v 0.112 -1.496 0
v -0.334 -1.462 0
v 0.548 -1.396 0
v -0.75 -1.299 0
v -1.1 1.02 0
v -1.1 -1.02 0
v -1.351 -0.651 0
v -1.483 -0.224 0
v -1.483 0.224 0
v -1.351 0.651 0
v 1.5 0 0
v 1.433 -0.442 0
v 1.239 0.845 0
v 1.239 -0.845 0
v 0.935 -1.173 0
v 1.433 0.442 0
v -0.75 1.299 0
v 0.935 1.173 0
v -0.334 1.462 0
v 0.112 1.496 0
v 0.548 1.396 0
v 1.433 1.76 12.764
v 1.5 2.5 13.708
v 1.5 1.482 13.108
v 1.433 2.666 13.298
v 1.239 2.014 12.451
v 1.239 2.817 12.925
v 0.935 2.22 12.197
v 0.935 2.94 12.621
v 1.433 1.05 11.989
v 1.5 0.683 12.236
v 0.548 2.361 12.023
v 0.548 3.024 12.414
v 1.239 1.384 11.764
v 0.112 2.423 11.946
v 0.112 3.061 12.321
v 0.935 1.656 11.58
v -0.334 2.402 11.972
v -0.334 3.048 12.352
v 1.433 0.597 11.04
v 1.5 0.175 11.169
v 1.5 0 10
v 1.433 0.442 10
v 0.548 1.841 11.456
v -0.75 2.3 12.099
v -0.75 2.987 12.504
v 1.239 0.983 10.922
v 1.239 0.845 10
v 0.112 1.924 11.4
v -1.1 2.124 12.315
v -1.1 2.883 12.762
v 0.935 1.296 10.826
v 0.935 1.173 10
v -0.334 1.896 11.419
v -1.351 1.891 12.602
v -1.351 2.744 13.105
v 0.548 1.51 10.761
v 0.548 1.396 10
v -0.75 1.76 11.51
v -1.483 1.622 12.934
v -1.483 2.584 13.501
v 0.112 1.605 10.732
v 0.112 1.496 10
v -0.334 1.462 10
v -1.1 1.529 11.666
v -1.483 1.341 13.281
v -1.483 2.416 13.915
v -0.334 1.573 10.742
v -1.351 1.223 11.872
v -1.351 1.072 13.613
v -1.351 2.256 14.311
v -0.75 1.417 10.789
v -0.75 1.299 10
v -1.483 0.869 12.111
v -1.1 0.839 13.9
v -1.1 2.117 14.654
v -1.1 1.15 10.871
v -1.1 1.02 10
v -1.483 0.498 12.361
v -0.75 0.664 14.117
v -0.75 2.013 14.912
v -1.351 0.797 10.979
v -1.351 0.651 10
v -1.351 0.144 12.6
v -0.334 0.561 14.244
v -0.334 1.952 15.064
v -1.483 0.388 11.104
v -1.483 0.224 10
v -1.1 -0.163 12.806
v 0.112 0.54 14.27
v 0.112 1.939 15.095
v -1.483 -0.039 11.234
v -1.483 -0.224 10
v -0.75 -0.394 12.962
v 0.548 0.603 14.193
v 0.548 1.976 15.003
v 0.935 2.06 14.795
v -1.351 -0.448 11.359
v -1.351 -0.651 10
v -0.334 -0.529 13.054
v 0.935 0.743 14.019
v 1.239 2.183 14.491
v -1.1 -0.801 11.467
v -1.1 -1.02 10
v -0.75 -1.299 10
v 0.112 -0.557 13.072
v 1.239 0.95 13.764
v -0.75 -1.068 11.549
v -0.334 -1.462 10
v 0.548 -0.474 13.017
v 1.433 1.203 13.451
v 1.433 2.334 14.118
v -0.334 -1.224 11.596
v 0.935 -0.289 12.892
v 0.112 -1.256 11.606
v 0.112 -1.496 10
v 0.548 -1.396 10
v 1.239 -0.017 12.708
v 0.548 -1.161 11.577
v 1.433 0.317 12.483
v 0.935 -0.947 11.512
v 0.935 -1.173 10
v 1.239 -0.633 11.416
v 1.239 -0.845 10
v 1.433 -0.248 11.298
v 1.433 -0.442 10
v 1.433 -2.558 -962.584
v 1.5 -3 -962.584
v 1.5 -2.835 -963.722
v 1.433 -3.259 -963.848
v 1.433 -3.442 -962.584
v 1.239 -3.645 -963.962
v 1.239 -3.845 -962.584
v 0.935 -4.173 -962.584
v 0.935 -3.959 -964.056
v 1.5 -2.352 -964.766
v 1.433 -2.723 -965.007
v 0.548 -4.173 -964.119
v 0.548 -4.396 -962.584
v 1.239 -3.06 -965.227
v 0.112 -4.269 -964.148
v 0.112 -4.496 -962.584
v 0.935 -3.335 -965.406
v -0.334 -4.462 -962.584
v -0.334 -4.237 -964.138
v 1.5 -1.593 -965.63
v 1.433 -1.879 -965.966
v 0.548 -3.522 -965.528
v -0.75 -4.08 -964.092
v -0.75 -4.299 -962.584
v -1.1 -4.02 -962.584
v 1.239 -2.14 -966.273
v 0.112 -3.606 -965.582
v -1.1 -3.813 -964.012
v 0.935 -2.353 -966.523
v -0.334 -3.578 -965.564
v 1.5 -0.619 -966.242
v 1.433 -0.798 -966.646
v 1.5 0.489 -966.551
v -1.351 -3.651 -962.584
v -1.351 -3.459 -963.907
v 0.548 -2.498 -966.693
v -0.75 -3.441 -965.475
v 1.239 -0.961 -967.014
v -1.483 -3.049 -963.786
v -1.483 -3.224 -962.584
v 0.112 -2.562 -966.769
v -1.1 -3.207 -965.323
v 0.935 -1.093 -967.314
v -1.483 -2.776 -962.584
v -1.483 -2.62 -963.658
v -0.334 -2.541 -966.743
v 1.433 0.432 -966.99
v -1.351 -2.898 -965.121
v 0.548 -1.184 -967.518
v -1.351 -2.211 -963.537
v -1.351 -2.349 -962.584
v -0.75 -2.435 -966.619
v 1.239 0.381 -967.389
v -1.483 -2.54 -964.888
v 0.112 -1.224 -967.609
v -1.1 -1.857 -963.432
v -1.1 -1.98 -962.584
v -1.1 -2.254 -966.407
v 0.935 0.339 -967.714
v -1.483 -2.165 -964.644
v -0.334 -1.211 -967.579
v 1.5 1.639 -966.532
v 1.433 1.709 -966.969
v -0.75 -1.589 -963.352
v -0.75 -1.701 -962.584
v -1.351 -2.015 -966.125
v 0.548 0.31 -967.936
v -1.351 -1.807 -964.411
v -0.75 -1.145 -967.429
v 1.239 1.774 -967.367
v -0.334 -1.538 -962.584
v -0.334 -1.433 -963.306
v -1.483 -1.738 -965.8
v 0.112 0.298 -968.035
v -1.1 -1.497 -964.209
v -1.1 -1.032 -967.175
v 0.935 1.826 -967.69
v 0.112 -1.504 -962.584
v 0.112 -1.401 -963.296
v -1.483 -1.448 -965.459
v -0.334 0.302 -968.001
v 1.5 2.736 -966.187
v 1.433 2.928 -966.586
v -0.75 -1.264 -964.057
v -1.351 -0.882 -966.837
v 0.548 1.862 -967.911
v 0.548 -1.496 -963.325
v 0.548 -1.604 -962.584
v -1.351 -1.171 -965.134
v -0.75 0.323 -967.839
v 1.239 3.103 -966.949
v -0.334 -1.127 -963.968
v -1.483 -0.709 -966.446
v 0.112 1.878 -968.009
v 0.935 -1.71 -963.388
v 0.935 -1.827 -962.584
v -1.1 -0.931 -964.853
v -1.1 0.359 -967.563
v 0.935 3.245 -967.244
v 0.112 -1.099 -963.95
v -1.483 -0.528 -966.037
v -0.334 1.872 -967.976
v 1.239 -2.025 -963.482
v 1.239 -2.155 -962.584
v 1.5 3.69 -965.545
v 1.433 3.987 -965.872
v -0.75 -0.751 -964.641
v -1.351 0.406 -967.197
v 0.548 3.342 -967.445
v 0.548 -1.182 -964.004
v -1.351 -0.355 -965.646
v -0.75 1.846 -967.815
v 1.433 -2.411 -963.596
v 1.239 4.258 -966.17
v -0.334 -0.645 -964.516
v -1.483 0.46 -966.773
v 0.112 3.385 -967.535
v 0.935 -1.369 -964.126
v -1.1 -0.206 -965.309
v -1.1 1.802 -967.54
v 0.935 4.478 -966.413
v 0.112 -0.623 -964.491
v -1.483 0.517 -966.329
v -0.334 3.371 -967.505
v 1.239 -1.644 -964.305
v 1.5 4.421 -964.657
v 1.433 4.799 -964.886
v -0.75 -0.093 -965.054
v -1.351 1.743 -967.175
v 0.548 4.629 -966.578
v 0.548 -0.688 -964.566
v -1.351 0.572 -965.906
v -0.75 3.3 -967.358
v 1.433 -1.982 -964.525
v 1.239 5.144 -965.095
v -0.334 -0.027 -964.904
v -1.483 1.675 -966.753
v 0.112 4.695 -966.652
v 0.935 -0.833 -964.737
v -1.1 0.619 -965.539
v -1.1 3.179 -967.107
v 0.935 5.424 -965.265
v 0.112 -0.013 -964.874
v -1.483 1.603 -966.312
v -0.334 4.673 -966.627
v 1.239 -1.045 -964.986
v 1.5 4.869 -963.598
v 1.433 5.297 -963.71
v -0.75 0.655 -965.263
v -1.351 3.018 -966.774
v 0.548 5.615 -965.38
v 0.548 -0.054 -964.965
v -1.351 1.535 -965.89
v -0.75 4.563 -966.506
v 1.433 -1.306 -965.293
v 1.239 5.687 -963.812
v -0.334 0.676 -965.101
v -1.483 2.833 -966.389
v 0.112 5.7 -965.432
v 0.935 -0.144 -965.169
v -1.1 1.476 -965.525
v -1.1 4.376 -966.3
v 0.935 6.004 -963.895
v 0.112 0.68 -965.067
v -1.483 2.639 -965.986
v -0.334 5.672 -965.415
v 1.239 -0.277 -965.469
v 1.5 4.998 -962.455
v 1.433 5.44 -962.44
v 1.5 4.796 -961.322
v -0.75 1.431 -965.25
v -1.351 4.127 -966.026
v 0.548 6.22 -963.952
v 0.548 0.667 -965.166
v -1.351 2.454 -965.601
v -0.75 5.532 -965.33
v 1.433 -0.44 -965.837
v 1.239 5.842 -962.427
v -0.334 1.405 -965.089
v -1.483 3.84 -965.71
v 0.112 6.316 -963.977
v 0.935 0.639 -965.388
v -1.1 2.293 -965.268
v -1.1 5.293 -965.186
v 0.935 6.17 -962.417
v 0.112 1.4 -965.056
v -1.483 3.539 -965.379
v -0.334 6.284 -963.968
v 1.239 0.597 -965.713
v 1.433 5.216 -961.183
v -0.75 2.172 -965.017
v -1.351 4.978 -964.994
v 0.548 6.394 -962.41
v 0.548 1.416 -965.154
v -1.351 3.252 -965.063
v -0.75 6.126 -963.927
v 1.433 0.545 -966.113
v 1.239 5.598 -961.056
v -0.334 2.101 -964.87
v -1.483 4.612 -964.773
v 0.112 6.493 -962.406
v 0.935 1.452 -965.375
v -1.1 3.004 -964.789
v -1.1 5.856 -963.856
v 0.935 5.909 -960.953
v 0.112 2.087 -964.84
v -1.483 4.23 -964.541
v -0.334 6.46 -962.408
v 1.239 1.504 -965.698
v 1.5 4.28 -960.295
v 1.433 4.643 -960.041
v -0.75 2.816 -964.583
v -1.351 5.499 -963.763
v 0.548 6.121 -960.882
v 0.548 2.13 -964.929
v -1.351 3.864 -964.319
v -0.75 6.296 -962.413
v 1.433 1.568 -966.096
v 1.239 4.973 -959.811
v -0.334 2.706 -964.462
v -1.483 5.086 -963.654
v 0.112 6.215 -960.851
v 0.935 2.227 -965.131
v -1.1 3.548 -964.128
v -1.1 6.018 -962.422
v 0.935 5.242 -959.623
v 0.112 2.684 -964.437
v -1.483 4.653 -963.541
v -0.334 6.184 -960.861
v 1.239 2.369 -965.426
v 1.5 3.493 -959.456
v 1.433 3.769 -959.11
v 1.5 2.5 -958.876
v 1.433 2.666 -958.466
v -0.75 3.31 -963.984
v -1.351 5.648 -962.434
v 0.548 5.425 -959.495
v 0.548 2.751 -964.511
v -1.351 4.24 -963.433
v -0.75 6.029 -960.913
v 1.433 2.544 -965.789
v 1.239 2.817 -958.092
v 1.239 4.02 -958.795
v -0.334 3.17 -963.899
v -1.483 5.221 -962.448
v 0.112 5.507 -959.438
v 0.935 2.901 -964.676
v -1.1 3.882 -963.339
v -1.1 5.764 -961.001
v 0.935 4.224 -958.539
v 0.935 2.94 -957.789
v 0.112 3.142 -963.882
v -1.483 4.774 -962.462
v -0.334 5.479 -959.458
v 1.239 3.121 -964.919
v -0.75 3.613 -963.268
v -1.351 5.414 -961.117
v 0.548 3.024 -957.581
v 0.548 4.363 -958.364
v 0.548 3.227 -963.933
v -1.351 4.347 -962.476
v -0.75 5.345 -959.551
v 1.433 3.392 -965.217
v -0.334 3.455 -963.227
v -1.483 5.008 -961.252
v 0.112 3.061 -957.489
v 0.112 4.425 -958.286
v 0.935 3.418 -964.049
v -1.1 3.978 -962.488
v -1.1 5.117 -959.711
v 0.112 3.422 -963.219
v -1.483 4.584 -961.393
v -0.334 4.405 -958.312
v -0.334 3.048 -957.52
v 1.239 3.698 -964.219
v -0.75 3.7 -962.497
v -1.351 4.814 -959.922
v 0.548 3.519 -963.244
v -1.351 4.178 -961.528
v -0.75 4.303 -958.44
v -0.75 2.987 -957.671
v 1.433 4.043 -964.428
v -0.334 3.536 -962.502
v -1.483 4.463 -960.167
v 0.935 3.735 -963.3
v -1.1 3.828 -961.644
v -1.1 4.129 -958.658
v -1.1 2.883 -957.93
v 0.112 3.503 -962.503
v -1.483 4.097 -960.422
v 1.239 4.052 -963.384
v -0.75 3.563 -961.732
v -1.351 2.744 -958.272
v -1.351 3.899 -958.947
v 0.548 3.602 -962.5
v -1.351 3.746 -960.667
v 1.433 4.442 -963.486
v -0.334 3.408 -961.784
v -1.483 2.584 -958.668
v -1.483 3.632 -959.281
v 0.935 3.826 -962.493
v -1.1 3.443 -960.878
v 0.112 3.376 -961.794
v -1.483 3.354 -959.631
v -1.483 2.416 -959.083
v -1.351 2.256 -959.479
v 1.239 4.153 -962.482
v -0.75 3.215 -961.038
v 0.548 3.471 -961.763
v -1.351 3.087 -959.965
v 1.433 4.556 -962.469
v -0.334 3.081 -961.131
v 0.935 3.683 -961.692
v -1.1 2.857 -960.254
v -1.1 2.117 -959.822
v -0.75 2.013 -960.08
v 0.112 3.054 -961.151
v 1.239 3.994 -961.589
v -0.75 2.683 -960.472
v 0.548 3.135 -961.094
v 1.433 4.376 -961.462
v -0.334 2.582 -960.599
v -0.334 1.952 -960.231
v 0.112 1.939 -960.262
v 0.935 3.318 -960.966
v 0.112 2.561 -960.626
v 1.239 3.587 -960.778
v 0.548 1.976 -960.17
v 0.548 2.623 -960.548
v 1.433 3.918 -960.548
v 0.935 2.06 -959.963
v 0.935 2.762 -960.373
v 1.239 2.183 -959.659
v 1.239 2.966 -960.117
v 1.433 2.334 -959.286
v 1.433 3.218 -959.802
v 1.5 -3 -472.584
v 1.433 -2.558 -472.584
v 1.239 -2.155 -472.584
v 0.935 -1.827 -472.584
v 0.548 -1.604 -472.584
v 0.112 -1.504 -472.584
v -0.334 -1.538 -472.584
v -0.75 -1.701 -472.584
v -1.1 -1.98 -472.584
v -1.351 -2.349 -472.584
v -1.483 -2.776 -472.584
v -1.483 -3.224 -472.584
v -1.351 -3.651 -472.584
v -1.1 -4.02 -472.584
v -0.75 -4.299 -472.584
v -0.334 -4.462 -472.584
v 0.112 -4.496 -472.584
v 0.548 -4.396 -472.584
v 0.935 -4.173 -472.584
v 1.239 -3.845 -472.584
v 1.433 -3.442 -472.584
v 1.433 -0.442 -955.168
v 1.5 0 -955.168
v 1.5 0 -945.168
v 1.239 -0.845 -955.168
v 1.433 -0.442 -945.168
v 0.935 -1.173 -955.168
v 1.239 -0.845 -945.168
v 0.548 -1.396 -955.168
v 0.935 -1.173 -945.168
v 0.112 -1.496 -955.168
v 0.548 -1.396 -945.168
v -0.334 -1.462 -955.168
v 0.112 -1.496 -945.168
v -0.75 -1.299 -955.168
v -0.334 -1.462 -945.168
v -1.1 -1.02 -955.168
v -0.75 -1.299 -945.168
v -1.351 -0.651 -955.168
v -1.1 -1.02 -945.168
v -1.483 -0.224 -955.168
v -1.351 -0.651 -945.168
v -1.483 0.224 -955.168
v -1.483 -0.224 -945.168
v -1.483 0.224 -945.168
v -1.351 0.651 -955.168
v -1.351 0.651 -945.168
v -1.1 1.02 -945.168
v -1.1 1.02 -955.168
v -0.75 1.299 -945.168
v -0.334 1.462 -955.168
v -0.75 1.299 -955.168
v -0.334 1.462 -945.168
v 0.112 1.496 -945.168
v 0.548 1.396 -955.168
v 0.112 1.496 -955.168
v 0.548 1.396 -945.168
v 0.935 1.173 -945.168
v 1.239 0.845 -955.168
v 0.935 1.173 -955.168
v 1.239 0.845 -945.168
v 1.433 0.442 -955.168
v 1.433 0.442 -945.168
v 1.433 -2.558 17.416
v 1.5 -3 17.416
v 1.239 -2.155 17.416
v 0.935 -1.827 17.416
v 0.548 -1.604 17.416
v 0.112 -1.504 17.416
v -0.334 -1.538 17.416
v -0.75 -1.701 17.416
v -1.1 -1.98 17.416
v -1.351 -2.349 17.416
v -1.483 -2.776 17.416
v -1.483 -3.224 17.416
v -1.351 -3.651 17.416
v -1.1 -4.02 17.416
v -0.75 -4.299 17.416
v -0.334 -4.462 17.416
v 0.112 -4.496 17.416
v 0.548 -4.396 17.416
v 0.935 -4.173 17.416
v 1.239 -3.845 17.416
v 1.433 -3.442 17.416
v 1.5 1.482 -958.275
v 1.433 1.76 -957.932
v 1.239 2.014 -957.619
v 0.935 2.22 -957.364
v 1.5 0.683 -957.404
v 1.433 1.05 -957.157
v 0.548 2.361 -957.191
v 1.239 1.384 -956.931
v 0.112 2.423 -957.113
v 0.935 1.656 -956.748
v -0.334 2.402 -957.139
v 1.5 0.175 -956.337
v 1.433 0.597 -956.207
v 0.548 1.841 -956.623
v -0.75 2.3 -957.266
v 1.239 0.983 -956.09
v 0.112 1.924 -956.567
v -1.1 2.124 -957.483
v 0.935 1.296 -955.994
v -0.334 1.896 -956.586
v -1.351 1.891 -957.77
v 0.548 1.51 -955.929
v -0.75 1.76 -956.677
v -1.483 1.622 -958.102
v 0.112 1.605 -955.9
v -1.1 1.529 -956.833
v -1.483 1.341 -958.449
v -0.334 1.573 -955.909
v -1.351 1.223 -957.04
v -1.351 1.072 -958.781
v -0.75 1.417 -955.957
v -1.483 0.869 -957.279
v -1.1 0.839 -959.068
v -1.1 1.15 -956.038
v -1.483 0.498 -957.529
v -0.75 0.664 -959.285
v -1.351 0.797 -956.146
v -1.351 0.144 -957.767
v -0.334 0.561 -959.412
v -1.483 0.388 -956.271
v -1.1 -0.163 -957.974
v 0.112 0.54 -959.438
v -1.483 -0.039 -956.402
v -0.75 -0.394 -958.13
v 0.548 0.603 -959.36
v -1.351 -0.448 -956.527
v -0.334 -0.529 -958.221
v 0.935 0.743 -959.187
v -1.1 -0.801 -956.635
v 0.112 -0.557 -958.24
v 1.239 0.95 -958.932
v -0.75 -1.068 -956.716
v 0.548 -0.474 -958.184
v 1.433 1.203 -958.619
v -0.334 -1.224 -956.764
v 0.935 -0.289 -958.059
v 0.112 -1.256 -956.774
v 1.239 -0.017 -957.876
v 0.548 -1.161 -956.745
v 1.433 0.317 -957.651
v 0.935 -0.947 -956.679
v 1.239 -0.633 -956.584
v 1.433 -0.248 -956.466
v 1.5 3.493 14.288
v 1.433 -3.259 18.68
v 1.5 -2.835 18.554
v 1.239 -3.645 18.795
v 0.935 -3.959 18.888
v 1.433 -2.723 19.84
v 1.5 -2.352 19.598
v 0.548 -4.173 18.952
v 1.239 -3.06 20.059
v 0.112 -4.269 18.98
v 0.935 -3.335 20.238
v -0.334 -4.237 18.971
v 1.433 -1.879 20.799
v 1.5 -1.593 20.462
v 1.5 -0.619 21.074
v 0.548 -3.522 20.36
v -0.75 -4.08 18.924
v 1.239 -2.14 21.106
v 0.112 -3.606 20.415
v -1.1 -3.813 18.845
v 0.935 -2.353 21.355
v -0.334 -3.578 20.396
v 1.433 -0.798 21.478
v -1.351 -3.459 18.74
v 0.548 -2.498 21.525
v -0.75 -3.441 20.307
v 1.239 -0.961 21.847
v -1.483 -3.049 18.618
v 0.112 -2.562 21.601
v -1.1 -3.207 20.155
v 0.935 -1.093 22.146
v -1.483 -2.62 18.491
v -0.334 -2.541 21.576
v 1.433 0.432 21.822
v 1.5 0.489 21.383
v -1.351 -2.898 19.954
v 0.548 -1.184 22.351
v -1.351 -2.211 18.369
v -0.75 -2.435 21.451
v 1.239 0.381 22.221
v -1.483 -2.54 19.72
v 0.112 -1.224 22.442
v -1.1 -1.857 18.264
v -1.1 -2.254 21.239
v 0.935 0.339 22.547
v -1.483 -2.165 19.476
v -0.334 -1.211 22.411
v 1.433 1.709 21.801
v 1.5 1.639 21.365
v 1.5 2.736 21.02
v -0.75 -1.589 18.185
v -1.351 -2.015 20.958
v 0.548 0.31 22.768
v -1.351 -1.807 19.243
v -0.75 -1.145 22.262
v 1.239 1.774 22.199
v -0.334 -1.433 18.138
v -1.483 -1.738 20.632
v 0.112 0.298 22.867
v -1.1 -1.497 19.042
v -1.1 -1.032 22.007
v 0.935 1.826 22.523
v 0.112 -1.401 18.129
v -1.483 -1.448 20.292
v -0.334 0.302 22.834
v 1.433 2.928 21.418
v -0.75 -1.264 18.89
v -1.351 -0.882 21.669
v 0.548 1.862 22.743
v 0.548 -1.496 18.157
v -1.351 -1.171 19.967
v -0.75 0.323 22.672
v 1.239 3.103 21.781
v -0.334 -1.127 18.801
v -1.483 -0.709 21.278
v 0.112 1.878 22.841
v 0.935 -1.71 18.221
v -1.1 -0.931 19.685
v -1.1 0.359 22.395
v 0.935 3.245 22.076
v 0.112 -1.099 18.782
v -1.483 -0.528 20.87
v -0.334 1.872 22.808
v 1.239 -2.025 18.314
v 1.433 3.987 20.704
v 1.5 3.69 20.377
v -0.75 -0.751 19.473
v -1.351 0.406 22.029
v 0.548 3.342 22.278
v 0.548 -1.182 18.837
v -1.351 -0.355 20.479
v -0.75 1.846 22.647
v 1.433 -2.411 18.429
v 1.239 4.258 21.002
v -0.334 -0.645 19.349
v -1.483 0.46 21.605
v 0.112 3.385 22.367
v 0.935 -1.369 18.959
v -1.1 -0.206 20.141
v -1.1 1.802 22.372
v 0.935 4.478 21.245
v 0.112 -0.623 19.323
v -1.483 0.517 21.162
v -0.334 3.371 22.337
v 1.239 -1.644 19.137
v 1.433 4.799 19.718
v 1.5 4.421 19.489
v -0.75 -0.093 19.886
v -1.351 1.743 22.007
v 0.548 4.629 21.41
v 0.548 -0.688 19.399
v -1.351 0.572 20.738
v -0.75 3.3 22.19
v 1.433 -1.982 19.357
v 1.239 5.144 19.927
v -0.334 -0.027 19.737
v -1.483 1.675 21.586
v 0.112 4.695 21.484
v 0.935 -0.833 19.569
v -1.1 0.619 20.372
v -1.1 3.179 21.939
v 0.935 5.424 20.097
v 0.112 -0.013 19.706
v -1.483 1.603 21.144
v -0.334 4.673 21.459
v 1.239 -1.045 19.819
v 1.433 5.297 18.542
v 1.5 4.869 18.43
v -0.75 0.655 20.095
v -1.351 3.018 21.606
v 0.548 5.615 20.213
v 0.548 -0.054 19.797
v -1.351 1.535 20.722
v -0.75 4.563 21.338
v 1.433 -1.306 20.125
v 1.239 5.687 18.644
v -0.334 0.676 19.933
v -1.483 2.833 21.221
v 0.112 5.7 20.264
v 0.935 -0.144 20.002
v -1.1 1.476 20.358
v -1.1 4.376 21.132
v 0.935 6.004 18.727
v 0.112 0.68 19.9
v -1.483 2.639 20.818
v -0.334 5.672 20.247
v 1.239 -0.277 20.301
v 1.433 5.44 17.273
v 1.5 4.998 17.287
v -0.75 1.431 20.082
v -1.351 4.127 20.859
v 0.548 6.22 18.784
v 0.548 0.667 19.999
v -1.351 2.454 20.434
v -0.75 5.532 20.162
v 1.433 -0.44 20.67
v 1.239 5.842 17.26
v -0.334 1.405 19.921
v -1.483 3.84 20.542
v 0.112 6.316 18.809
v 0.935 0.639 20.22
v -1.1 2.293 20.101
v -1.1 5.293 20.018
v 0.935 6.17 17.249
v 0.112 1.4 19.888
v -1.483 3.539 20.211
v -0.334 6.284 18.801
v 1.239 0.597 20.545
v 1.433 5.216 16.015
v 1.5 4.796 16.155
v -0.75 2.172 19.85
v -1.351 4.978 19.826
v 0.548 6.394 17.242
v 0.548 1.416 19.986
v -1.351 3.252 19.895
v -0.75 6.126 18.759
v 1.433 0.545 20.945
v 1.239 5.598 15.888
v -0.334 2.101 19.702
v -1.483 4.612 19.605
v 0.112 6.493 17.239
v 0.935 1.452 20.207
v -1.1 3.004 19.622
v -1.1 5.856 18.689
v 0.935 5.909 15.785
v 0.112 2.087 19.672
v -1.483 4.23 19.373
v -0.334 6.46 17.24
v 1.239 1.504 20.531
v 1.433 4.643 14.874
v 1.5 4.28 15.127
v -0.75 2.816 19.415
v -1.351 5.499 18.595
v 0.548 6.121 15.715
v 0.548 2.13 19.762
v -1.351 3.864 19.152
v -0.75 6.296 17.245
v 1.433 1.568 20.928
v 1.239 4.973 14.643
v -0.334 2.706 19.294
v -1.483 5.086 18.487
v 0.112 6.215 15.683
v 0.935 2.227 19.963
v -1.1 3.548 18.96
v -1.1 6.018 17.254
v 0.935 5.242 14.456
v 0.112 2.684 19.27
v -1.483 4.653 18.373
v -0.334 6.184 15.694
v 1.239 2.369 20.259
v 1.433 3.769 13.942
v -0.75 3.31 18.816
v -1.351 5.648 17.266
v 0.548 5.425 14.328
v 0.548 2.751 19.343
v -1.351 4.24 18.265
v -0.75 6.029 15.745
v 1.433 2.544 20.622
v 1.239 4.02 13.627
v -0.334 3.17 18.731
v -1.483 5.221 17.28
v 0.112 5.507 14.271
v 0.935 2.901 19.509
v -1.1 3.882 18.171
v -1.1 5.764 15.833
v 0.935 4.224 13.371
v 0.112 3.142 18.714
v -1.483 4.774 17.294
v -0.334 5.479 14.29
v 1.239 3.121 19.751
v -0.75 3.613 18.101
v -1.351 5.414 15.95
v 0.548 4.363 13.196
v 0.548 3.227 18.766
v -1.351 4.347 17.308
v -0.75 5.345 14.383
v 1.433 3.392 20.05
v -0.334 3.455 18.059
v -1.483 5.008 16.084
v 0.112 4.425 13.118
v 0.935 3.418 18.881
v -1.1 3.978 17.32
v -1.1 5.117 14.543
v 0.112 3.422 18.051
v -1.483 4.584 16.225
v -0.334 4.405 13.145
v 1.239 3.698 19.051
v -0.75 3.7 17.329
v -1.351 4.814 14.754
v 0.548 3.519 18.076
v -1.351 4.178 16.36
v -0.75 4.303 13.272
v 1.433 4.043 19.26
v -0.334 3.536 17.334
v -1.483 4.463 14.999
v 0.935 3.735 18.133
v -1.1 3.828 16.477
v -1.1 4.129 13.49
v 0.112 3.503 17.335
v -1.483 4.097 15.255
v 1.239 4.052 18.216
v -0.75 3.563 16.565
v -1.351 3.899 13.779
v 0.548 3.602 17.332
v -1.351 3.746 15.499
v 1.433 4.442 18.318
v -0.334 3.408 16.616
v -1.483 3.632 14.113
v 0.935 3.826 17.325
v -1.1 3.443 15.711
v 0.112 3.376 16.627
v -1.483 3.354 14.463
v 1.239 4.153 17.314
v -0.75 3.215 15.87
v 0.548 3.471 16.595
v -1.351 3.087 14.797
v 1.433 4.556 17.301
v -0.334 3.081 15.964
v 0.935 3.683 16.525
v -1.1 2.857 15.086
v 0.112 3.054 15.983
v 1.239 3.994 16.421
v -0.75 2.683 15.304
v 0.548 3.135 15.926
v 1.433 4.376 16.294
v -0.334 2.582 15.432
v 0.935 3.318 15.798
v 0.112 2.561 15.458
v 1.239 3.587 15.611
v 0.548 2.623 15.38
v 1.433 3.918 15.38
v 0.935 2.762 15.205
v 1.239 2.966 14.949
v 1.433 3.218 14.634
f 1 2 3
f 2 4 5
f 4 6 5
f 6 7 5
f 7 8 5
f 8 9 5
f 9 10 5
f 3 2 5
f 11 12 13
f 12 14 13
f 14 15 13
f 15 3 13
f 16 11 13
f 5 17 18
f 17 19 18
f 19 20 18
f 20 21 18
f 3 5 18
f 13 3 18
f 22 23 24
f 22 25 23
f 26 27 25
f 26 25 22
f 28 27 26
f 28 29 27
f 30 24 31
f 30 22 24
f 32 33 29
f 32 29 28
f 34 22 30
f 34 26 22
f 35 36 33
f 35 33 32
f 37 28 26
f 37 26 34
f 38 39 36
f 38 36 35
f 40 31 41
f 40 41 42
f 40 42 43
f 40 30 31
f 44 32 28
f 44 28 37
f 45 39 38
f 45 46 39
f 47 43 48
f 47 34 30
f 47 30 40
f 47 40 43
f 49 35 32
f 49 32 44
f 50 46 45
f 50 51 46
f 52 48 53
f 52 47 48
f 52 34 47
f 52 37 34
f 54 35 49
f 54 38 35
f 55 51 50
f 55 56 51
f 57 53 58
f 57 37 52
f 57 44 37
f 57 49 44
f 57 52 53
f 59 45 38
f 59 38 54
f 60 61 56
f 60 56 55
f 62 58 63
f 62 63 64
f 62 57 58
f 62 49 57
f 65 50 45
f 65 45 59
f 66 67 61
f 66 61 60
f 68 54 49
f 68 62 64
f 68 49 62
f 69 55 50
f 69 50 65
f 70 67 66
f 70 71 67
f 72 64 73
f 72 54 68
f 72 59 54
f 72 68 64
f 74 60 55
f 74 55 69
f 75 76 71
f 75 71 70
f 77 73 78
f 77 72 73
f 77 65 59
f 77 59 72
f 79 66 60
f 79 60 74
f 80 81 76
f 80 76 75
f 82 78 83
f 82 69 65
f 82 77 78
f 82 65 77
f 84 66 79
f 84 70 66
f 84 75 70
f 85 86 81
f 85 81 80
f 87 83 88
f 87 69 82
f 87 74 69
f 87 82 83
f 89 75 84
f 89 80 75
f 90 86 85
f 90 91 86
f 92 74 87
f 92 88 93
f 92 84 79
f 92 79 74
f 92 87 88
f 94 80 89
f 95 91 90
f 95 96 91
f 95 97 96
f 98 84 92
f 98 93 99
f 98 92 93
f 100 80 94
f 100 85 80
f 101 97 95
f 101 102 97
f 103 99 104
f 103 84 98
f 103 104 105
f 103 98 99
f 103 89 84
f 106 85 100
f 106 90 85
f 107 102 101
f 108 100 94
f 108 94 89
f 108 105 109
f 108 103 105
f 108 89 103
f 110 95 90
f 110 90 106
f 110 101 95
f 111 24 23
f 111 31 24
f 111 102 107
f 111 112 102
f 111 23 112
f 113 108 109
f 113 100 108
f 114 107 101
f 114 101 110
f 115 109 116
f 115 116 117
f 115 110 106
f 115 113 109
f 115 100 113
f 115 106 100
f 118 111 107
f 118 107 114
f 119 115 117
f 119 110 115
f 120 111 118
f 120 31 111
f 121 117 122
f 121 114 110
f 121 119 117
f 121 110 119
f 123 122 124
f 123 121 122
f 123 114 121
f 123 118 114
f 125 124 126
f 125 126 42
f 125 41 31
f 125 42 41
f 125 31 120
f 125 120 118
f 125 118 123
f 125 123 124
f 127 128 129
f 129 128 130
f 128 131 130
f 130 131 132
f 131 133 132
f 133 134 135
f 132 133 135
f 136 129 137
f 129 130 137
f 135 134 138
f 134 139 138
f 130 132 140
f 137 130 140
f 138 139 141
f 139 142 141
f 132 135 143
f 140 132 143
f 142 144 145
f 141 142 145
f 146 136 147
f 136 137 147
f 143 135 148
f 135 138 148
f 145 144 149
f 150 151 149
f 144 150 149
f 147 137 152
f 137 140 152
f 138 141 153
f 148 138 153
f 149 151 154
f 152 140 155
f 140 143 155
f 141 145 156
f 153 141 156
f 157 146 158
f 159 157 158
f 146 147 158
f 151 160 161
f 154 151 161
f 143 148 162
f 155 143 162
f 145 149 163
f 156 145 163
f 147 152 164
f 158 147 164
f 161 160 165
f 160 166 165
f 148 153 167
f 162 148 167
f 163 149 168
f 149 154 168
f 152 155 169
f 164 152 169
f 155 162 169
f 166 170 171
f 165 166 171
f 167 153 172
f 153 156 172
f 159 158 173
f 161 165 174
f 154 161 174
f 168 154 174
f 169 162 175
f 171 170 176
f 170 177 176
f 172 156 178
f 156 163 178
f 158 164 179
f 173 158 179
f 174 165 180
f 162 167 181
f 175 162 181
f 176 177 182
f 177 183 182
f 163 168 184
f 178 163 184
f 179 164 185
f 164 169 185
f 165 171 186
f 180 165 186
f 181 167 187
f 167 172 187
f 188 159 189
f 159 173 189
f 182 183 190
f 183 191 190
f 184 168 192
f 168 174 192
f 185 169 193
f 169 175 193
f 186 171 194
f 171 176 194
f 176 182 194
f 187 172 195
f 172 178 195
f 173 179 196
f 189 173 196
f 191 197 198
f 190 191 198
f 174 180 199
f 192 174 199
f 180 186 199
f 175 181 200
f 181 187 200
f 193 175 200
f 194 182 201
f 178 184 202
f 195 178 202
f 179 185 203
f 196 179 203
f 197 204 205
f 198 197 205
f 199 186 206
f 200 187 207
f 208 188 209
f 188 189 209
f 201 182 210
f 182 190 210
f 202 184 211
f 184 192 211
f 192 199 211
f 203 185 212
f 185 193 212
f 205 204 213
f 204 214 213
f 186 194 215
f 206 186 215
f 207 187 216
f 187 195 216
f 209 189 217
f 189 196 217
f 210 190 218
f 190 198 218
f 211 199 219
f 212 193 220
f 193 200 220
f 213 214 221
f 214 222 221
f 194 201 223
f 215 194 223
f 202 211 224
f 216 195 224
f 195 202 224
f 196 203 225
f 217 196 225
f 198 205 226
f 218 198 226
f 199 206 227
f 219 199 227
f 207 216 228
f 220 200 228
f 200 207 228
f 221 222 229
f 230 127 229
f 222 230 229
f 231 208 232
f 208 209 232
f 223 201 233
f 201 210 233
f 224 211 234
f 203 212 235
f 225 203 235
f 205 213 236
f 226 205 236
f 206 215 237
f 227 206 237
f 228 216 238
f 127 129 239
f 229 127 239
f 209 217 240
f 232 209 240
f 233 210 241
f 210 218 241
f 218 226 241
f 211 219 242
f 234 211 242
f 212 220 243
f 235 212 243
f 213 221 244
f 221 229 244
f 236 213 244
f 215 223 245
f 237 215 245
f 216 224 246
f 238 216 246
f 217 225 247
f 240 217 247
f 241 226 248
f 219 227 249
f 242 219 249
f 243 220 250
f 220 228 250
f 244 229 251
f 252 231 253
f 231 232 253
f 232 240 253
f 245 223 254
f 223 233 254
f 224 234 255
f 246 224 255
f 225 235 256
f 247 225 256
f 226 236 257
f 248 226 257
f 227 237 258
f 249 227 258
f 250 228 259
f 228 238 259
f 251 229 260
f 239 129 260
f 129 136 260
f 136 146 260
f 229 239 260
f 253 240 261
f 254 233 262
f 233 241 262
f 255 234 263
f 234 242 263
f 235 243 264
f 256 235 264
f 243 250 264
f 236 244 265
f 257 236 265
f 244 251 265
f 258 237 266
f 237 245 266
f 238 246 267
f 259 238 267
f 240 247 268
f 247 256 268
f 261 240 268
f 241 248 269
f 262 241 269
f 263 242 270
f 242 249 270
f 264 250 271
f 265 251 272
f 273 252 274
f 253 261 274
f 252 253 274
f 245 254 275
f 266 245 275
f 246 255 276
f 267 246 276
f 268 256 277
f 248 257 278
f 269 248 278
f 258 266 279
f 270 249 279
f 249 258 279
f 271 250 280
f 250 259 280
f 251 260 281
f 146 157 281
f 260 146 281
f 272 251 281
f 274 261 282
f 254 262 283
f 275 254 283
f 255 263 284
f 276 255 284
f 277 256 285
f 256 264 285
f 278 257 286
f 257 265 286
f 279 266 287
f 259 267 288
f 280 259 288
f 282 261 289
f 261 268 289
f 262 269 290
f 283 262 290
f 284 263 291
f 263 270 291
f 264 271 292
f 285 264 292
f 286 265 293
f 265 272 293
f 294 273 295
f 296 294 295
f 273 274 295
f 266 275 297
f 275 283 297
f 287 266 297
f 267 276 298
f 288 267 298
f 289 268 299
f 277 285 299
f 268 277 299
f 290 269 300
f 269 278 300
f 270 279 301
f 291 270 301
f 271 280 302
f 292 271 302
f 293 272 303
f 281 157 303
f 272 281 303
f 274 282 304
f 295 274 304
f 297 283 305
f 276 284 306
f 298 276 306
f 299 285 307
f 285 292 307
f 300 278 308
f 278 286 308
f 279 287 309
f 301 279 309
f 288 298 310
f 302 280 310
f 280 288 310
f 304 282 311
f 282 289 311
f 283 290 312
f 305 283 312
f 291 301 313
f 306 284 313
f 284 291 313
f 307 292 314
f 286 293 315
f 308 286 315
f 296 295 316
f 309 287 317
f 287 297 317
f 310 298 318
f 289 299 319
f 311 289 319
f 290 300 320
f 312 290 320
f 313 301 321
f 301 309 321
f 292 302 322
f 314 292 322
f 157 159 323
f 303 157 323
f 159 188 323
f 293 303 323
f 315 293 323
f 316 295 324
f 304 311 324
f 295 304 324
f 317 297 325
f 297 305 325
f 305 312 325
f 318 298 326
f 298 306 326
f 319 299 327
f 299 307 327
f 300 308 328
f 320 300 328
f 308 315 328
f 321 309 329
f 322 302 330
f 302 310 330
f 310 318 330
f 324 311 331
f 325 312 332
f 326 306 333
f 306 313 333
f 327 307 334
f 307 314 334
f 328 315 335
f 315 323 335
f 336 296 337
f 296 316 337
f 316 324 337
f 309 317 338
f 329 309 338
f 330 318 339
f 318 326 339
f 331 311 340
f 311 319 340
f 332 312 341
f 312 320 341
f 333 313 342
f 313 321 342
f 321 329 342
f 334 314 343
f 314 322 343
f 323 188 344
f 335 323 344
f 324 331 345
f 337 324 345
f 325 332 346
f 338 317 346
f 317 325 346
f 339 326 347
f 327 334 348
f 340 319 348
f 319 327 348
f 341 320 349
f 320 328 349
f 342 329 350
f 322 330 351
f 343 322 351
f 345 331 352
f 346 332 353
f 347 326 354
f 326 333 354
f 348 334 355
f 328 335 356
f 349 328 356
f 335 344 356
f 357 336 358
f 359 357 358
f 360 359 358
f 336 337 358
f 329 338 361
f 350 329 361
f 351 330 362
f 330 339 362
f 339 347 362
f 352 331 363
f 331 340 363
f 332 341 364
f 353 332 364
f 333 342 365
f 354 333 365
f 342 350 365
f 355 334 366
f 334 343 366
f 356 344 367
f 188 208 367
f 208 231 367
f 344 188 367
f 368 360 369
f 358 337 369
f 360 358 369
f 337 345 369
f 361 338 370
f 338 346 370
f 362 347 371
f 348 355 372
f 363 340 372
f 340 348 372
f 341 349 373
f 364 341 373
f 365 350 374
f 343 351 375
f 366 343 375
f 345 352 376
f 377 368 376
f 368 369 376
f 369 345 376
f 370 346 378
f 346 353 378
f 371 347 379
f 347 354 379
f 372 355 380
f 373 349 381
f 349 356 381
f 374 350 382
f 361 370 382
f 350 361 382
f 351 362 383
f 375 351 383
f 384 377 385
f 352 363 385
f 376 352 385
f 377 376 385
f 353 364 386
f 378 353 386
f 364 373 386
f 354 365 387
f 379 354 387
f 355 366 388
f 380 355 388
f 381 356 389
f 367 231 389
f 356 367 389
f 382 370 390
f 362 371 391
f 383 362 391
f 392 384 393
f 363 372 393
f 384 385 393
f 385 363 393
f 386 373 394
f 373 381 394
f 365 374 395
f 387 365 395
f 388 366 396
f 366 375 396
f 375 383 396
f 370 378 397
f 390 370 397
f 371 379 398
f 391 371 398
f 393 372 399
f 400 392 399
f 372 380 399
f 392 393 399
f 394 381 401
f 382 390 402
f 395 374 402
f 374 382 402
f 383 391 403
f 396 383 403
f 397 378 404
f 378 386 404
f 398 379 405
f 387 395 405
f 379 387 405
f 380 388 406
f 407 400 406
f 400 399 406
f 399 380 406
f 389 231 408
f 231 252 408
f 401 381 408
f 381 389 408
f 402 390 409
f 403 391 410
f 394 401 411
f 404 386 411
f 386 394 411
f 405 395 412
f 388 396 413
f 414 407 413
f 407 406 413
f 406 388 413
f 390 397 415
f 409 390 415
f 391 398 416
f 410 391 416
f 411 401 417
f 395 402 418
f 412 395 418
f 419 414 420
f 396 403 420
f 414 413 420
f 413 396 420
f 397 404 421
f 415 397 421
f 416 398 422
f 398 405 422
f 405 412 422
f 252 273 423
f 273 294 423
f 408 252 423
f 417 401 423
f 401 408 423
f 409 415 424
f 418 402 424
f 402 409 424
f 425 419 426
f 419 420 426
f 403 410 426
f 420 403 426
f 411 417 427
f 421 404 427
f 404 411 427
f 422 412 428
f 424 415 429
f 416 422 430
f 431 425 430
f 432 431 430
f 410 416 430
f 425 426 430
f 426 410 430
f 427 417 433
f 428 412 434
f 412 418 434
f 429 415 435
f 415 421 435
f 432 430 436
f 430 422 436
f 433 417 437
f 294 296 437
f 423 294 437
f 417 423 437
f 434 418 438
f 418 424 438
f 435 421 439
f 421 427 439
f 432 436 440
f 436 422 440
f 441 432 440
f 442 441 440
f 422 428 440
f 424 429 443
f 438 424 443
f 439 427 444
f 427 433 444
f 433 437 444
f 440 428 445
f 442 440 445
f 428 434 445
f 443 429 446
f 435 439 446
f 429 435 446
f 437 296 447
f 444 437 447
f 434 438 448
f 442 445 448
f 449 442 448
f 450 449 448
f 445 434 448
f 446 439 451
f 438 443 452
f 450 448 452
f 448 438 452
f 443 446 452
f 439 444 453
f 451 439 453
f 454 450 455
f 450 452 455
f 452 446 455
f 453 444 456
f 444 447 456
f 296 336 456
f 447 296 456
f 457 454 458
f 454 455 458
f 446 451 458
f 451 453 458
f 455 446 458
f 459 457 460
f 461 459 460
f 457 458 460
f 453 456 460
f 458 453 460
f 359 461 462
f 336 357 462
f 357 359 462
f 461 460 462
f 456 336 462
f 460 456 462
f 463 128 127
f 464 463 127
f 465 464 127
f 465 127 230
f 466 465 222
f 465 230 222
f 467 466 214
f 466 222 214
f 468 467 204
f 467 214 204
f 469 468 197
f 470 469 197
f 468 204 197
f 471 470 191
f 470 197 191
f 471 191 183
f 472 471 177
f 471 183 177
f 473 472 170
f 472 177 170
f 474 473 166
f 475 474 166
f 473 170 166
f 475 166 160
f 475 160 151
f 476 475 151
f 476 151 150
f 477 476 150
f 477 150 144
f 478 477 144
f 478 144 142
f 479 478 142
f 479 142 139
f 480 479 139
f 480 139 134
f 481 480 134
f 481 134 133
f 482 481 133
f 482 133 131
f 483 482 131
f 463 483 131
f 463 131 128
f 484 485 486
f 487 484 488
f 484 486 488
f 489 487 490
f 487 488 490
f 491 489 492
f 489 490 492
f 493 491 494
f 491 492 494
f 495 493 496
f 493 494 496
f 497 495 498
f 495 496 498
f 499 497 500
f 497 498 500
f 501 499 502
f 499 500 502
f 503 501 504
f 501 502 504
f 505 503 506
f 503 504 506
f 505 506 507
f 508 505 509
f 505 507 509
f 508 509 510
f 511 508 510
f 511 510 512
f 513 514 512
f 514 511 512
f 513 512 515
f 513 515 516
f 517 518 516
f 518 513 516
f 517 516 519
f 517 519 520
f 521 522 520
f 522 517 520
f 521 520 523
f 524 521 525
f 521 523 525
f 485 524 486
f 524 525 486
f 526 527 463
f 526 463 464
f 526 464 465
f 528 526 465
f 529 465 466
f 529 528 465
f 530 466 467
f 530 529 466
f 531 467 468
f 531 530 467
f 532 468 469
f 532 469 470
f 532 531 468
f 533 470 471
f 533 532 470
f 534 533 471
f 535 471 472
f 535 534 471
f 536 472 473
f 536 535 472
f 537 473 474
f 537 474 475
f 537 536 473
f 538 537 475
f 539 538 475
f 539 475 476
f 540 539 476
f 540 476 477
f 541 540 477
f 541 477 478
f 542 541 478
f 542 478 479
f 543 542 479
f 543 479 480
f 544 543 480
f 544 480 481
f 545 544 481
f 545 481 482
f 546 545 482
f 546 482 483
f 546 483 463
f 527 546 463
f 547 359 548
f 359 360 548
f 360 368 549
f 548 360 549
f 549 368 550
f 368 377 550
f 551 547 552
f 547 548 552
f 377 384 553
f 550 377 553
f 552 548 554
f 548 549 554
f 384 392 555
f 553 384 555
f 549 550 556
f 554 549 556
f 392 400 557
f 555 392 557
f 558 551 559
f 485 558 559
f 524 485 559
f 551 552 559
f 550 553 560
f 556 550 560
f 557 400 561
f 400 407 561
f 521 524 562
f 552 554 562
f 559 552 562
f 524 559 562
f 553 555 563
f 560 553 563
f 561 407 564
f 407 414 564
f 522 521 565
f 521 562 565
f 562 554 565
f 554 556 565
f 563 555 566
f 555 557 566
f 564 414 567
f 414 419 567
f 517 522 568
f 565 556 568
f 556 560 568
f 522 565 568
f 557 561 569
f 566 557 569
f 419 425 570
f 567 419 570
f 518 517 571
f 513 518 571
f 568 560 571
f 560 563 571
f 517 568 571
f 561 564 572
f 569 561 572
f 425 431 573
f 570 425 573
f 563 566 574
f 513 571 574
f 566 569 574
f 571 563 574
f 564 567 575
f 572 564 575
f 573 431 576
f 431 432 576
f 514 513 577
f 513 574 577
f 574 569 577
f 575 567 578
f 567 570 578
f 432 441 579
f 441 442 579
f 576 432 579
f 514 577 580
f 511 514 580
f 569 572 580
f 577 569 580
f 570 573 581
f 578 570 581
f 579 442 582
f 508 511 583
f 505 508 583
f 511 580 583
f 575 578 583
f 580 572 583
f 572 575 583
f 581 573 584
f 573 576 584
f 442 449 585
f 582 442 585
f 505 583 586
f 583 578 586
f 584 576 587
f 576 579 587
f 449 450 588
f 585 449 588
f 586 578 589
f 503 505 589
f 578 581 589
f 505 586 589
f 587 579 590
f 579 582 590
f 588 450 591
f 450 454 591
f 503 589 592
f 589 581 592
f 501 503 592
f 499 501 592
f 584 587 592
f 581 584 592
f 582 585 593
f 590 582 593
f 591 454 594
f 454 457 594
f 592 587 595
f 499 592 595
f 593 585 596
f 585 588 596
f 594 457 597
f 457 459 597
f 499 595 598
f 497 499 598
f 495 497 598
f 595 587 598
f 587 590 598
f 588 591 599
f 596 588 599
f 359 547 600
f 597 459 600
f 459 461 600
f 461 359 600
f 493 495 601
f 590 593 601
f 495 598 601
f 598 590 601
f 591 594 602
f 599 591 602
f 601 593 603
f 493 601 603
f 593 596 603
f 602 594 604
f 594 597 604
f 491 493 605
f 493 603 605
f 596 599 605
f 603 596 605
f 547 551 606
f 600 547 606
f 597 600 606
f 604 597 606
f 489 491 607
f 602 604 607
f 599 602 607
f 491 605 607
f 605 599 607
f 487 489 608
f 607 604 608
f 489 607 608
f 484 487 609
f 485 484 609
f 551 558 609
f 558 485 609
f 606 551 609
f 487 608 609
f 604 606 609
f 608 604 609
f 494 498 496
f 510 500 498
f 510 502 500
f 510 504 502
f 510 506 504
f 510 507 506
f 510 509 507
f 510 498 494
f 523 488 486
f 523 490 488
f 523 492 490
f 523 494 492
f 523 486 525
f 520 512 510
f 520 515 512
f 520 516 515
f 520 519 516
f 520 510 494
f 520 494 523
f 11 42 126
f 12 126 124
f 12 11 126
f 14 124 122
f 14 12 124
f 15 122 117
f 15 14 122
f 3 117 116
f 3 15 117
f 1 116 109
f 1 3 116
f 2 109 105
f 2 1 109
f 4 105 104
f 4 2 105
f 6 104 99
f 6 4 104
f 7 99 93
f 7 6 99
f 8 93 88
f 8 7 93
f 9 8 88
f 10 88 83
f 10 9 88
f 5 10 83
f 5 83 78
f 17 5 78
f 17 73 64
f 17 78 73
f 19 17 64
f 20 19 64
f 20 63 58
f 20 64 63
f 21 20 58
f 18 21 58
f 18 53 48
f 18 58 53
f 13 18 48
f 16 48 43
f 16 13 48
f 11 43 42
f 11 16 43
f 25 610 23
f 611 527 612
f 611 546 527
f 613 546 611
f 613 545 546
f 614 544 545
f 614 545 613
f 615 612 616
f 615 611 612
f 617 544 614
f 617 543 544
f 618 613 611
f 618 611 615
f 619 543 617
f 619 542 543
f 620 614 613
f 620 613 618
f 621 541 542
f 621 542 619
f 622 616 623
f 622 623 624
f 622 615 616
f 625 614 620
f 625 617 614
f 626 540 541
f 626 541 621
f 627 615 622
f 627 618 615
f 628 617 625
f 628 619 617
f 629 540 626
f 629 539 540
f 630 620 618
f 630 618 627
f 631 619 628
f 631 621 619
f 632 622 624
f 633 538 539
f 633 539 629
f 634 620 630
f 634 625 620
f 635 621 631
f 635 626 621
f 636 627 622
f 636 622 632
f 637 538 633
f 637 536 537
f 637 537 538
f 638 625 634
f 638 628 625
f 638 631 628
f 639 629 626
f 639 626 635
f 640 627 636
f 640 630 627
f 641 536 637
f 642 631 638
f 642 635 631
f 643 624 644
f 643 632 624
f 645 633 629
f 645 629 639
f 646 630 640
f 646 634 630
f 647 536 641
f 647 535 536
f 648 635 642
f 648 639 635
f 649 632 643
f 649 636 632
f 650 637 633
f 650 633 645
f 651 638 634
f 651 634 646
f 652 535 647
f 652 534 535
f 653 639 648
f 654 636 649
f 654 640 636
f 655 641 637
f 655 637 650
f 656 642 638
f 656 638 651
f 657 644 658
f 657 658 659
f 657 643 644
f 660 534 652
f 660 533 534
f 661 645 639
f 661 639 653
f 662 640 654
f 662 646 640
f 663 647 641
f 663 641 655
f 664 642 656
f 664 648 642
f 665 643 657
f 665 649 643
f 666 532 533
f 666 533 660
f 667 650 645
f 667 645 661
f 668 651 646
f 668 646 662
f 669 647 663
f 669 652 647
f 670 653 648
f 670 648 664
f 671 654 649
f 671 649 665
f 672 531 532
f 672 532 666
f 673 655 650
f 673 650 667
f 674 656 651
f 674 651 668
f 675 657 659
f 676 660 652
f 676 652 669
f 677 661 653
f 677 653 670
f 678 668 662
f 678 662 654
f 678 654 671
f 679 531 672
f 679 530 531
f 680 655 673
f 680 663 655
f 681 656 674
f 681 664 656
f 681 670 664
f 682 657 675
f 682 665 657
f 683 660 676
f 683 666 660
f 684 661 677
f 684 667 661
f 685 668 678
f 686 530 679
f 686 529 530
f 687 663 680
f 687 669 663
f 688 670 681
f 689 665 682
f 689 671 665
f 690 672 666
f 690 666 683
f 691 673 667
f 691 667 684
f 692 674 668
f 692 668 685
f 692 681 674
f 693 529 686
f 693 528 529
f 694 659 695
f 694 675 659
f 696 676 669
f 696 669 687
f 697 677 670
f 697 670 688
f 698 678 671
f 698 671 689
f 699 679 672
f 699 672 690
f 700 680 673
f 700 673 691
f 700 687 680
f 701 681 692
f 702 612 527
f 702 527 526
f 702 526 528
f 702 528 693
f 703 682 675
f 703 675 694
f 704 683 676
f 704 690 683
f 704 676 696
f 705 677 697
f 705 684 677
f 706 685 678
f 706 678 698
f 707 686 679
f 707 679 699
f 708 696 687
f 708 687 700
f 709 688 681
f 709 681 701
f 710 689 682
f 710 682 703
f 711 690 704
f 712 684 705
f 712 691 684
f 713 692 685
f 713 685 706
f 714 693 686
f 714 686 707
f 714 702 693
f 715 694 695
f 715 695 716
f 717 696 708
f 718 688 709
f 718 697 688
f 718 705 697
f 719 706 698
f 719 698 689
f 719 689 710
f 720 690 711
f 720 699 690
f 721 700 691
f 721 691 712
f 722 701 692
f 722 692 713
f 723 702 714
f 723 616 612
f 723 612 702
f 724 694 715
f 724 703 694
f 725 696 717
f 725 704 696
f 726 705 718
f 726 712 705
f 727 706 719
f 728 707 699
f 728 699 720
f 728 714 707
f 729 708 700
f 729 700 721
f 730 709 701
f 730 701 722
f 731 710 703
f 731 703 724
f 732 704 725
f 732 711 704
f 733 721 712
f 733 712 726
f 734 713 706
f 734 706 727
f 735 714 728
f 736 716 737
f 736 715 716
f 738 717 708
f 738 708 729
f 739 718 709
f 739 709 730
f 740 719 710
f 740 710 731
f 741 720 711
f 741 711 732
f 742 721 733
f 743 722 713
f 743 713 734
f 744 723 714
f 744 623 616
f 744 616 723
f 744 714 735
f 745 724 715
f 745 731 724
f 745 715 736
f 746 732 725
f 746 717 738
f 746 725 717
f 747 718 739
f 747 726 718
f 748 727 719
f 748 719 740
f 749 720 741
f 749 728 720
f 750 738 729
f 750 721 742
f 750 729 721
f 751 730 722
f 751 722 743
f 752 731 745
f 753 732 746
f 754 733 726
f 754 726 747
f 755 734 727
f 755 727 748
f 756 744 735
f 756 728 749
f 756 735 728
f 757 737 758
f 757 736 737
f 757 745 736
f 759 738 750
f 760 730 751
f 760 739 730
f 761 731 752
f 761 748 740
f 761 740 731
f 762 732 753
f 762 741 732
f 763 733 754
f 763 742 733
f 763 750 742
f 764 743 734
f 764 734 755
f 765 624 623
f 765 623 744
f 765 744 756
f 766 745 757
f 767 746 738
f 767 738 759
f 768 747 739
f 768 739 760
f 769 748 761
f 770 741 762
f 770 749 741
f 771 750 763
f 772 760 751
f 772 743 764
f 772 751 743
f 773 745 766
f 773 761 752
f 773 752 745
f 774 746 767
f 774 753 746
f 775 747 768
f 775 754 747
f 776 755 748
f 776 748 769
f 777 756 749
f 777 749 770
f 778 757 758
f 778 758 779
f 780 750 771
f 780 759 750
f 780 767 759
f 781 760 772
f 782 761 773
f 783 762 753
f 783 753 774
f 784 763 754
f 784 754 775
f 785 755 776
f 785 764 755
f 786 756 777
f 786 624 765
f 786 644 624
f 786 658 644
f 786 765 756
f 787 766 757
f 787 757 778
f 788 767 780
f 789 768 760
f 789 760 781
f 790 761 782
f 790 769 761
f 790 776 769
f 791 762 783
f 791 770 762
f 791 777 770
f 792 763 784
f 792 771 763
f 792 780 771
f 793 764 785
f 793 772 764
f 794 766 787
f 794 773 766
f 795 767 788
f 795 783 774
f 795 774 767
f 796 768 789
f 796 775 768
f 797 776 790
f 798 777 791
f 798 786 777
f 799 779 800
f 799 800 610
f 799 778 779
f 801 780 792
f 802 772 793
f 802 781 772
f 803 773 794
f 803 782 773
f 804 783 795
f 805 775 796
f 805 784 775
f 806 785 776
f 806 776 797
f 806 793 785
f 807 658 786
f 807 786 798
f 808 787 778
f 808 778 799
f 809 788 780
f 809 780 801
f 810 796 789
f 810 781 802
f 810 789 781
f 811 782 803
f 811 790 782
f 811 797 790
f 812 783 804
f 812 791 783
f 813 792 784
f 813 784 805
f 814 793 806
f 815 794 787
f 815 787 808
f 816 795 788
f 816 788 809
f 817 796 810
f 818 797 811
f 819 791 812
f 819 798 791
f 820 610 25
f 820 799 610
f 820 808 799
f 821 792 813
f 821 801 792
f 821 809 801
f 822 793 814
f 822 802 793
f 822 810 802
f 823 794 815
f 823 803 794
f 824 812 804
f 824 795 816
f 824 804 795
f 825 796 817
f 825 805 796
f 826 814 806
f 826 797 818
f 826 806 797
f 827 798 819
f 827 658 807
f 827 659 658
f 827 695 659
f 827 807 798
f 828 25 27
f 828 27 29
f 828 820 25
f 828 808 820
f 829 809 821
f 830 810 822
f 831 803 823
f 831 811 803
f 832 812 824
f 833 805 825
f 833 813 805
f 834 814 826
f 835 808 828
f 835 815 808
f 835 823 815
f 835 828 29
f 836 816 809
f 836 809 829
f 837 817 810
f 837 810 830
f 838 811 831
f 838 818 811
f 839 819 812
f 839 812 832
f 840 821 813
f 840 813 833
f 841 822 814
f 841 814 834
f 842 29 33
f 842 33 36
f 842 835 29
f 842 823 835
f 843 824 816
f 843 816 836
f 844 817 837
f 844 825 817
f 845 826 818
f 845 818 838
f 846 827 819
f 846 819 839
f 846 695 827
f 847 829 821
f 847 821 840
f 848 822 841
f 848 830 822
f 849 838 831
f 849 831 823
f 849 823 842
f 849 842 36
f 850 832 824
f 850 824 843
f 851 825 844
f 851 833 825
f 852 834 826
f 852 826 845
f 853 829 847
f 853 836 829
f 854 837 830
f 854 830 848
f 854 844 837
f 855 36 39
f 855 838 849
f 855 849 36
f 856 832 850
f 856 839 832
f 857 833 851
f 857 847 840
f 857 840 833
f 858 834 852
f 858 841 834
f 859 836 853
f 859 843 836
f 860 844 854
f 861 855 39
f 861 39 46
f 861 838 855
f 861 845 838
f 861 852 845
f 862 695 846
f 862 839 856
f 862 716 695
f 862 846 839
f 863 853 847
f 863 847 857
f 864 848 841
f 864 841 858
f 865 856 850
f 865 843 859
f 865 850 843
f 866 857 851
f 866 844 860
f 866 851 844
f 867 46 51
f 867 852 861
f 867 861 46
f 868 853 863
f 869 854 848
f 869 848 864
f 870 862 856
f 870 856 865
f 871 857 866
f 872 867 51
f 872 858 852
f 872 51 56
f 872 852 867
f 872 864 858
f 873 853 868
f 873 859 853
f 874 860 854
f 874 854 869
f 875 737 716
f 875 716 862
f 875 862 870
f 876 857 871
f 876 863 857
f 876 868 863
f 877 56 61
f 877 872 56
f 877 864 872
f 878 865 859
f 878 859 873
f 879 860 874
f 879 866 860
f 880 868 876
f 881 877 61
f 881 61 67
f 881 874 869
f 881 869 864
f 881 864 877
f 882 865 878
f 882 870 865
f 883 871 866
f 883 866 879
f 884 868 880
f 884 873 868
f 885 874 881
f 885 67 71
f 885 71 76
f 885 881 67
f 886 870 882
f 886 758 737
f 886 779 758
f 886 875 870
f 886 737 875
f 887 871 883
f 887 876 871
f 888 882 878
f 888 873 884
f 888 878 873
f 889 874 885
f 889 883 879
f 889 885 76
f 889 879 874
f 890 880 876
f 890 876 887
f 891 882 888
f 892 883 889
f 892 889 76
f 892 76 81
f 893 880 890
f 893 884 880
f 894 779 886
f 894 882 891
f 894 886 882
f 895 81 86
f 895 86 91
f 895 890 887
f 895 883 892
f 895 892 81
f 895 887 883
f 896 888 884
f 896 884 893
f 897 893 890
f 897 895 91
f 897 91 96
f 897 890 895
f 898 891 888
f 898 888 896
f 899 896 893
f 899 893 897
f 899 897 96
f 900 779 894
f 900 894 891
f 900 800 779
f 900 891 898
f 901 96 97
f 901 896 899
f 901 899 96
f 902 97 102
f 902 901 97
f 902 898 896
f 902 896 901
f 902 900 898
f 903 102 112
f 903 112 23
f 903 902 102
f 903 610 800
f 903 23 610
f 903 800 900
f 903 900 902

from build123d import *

# Parameters (mm, degrees)
SKETCH1_R = 1.5


with BuildPart() as part:
    # Sweep1: sweep along a path in Sketch2
    with BuildLine(Plane(origin=(0, 0, 0), x_dir=(0, 0, -1), z_dir=(1, 0, 0))) as sweep1_path:
        Line((472.583801513, -3), (-17.416198487, -3))
        ThreePointArc((-17.416198487, -3), (-20.732823277, 3.236067977), (-13.708099244, 2.5))
        ThreePointArc((-13.708099244, 2.5), (-12.236067977, 0.68337521), (-10, 0))
        Line((-10, 0), (0, 0))
    # Sketch1 → Sweep1 (sweep)
    with BuildSketch(Plane.XY):
        Circle(SKETCH1_R)
    sweep1 = sweep(path=sweep1_path.line)

    # Mirror1: Sweep1 across plane
    add(sweep1.mirror(Plane(origin=(0, -3, -472.583801513), x_dir=(1, 0, 0), z_dir=(0, 0, -1))))


solid = part.part
